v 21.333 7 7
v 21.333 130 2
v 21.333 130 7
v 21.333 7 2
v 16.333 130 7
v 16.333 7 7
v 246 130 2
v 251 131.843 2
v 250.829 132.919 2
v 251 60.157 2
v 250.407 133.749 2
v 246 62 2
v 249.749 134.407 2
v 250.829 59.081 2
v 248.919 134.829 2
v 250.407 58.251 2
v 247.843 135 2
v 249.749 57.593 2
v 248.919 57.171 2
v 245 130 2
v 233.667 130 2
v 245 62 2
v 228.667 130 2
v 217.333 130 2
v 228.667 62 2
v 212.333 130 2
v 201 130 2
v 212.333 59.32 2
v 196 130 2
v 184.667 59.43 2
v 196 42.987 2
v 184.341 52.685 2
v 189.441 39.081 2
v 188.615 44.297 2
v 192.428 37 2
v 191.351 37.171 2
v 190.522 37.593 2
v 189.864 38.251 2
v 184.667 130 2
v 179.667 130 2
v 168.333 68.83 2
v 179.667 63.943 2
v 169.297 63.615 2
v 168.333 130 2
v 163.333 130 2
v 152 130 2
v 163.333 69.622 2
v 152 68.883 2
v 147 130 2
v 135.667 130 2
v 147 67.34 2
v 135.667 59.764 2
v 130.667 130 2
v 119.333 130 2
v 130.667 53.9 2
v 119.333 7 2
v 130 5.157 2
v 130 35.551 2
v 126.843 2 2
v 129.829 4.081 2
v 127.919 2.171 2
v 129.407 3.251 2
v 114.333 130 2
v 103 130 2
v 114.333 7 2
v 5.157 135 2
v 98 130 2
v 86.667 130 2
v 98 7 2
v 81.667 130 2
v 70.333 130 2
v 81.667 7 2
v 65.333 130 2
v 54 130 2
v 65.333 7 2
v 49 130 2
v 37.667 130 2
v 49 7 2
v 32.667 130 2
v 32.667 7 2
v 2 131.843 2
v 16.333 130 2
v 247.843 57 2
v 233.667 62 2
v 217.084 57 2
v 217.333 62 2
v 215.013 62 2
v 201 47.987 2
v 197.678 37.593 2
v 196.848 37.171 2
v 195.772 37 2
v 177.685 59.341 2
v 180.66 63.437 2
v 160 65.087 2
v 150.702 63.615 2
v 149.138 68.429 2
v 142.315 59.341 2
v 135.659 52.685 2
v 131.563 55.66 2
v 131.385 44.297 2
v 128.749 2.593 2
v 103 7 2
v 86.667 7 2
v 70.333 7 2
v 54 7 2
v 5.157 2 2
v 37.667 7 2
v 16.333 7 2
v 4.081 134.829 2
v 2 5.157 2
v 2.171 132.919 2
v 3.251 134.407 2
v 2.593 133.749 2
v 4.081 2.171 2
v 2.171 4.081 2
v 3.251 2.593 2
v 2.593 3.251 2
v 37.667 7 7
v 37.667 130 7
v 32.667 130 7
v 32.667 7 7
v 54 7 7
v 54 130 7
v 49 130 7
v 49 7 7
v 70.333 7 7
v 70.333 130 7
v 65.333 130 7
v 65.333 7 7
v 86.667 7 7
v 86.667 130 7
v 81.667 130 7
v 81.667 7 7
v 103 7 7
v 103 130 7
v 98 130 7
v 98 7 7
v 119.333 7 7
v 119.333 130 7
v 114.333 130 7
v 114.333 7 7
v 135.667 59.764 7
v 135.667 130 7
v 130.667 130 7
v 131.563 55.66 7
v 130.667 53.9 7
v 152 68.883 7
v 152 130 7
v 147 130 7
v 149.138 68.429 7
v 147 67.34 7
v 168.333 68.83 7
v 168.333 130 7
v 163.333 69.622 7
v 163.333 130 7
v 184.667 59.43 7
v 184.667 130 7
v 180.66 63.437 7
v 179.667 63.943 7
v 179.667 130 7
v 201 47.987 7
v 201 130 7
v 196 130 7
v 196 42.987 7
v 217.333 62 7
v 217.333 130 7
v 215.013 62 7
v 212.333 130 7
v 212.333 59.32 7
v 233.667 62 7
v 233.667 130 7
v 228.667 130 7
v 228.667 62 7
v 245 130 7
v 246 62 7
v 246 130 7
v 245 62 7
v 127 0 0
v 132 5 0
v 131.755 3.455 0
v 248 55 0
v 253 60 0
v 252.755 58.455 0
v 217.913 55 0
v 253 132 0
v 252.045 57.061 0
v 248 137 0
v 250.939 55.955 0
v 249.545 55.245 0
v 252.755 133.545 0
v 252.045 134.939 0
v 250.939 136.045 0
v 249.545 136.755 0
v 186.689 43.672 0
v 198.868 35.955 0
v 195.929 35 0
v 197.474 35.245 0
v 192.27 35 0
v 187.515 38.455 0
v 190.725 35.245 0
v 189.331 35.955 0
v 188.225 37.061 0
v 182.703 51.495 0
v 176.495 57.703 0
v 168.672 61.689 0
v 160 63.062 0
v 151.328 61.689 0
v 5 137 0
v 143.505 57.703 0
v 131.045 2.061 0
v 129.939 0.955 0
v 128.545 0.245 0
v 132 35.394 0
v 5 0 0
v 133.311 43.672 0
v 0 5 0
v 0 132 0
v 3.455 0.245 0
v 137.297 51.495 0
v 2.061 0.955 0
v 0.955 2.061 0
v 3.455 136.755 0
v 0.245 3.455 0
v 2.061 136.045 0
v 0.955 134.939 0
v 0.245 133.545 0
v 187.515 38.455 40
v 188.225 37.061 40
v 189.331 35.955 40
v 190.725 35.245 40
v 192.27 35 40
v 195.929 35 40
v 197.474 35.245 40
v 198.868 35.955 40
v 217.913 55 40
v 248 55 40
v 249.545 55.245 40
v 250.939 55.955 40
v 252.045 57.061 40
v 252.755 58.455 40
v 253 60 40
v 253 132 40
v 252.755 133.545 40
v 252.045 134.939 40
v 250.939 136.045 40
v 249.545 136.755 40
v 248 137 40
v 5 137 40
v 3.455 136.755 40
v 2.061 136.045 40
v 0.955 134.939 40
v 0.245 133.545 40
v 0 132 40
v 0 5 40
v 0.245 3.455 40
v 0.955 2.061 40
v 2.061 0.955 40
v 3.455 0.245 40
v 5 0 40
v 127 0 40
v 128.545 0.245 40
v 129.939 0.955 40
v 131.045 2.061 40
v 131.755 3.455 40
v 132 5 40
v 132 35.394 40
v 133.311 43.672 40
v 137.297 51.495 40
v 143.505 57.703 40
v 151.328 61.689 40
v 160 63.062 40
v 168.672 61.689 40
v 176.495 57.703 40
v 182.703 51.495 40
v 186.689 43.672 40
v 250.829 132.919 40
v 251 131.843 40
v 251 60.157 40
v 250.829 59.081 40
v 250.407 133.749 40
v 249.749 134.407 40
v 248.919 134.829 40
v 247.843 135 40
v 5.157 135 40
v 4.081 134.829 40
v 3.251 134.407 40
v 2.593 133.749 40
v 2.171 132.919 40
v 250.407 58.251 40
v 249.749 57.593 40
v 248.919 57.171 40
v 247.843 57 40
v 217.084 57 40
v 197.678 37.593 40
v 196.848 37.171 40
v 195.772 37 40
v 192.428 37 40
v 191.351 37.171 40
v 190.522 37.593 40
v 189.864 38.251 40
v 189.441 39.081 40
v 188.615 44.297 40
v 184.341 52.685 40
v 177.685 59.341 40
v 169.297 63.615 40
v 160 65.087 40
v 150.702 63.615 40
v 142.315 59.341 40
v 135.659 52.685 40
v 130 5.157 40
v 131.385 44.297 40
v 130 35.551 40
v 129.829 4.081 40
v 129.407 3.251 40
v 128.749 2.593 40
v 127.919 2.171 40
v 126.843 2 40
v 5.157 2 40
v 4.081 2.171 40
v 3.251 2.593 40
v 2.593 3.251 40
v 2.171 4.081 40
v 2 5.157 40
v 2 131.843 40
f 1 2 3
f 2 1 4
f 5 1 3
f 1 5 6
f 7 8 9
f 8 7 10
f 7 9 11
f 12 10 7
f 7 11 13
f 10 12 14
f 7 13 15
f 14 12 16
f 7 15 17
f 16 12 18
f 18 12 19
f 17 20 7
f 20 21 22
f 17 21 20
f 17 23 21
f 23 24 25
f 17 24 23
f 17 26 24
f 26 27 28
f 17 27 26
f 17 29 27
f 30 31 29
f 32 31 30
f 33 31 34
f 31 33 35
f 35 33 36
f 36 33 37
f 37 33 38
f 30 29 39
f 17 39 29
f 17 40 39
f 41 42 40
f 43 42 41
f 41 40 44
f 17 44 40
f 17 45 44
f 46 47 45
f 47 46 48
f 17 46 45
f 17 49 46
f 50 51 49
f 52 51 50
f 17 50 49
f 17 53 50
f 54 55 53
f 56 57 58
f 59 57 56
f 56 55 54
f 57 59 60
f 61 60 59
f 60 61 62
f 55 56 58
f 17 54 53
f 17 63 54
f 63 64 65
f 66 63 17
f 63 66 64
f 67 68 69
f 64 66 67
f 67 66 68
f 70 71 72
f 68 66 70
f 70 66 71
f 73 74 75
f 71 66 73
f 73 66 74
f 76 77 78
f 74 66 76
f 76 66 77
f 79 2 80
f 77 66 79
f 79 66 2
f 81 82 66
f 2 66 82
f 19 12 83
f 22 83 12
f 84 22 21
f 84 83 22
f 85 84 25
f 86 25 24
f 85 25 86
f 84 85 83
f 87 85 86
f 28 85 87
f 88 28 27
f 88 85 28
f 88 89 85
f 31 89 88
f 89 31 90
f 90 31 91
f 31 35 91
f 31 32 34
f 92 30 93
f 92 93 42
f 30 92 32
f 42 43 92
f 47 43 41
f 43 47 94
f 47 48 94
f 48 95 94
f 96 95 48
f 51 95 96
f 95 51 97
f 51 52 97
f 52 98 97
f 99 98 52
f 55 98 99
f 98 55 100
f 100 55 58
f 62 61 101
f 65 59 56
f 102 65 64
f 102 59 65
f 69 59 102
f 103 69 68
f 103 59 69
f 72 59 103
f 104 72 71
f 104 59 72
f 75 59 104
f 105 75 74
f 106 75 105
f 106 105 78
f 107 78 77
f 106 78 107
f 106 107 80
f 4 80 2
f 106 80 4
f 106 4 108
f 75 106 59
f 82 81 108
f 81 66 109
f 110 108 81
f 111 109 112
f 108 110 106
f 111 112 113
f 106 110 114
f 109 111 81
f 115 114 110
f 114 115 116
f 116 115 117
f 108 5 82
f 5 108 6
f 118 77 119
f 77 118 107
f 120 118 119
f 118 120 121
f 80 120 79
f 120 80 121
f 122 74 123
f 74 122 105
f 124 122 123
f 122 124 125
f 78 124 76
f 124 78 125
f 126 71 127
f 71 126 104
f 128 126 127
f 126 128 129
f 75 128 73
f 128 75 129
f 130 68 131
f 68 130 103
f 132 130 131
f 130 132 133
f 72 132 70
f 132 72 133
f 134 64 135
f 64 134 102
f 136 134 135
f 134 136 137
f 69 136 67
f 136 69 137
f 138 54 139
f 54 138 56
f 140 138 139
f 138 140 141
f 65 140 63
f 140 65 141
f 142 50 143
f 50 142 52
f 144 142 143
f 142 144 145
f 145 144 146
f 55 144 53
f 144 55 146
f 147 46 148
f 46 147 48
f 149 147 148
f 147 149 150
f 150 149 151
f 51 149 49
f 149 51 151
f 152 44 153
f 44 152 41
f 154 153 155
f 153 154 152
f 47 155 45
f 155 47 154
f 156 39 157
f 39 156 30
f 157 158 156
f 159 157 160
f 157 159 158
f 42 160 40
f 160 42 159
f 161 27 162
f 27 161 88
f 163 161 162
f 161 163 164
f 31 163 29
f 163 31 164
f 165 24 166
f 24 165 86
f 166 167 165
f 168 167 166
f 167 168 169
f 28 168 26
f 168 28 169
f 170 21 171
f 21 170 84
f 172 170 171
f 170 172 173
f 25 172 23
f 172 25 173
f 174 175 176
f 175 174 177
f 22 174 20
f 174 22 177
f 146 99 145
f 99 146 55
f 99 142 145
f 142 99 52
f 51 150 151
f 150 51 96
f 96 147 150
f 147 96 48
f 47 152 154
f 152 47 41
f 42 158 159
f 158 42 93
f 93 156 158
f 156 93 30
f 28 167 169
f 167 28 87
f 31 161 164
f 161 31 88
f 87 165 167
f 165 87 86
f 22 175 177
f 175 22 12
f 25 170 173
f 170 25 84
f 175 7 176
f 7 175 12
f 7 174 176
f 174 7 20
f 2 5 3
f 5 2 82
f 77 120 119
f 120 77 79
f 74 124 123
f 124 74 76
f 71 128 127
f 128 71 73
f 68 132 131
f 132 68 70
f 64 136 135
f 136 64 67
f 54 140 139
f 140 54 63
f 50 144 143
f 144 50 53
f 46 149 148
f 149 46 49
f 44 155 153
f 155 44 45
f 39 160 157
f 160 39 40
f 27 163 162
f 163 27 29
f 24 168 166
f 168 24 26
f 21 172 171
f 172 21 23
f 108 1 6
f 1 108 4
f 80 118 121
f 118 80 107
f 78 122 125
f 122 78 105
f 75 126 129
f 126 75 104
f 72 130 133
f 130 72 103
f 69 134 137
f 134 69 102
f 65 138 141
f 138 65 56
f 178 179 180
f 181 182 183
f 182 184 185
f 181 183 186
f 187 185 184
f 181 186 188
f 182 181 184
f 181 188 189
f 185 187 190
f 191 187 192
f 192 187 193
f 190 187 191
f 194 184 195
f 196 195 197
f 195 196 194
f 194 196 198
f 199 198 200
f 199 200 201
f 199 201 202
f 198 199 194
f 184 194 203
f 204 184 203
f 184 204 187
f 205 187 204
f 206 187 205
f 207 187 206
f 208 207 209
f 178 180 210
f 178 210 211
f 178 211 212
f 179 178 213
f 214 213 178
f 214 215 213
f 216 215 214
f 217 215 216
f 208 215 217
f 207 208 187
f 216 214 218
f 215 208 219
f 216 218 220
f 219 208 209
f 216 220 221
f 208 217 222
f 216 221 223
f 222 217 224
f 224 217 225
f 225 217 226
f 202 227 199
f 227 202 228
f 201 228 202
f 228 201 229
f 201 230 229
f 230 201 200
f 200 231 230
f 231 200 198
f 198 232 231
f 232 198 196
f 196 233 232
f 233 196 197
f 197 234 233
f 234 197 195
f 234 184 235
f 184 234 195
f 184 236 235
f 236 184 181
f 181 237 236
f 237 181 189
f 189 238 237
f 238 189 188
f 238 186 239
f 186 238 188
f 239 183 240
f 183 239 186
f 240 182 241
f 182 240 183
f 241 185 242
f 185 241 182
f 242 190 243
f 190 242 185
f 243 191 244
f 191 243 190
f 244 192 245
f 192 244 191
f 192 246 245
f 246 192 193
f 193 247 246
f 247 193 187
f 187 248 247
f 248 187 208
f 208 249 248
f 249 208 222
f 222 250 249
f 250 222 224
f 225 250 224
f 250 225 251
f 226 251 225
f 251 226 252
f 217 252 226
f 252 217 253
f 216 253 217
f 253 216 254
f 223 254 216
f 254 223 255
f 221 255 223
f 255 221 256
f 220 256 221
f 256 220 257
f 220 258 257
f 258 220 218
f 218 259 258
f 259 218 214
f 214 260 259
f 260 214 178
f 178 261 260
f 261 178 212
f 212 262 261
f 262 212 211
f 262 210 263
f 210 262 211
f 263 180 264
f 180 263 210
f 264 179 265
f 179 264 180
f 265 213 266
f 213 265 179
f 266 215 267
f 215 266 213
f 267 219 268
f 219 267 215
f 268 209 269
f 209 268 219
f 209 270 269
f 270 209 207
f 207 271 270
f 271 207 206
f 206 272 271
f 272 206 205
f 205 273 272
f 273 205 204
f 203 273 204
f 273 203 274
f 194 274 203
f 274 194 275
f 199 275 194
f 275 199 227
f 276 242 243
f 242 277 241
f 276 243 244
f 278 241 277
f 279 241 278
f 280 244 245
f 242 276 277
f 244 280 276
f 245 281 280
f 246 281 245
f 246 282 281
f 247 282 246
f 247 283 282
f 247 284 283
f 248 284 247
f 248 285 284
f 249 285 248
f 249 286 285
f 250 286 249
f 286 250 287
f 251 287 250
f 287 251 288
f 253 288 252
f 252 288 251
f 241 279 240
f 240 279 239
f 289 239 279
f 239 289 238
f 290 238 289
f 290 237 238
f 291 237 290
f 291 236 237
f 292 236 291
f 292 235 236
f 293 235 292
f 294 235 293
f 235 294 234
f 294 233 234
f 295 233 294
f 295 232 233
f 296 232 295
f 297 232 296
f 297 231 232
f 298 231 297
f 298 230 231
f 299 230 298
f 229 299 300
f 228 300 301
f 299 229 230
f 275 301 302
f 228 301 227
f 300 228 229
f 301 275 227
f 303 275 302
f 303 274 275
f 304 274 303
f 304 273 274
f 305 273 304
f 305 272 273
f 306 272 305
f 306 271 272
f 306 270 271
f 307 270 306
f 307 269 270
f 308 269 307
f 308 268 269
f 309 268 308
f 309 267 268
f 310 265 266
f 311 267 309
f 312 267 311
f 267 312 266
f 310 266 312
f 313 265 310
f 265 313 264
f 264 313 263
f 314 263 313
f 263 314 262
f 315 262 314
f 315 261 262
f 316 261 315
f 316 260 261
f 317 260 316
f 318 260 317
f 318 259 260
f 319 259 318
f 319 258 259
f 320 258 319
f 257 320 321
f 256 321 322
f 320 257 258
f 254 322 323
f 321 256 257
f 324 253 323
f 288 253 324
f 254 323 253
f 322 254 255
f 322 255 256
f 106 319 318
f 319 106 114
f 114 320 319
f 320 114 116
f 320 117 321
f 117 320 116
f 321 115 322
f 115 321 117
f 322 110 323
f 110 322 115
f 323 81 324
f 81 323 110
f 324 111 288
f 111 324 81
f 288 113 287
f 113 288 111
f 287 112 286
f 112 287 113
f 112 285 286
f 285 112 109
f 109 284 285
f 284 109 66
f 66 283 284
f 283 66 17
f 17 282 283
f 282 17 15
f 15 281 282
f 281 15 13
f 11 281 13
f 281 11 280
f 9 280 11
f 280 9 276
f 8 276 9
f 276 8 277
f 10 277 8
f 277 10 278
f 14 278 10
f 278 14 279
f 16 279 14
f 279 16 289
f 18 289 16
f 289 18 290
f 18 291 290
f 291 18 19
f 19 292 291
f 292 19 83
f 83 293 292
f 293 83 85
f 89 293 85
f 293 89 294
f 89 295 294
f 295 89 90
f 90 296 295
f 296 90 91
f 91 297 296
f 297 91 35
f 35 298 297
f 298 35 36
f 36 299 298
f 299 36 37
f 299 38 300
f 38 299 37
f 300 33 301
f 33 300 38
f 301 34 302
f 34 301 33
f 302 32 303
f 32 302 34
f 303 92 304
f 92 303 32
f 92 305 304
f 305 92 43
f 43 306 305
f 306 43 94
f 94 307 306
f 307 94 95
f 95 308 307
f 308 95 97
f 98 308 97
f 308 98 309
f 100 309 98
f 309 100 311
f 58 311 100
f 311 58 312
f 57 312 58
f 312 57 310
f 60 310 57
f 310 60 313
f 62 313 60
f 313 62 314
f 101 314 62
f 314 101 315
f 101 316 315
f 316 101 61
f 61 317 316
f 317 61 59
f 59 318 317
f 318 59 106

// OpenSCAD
// Basic footpring (minus the faucet gap)
// +----+-----+----+----+
// | A  |  B  | D  | E  |
// |    |     +----+----+
// |    |     | C /
// |    |     |  /
// |    +-----|/  
// |    |
// +----+
//
// The faucet indentation will be at the bottom of B with its left edge at the
// left side of B.

a_dims = [132, 137];
b_dims = [66, 102];
c_dims = [20, 20];
d_dims = [c_dims[0], b_dims[1] - c_dims[1]];
e_dims = [35, d_dims[1]];
full_width = a_dims[0] + b_dims[0] + d_dims[0] + e_dims[0];
full_depth = a_dims[1];
faucet_radius = 56 / 2;
wall_thickness = 2;
corner_radius = 5;
wall_height = 40;
slat_count = 15;
slat_height = 5;
slat_width = 5;
slat_spacing = (full_width - (wall_thickness * 4)) / slat_count;
gutter_width = 5;
spout_offset = 20;
spout_width = 20;
spout_length = 40;


$fs=1;
$fn=20;

// The straight-edge outline of the plate (i.e. without the faucet indentation)
module hull() {
    union() {
        square(a_dims);
        translate([a_dims[0], a_dims[1] - b_dims[1]]) {
            square(b_dims);
            translate([b_dims[0], 0]) {
                polygon(points=[[0,0], c_dims, [0, c_dims[1]]]);
                translate([0, c_dims[1]]) {
                    square(d_dims);
                    translate([d_dims[0], 0]) {
                        square(e_dims);
                    }
                }
            }
        }
    }
}

// The full outline of the plate including the faucet indentation, but with square corners. We'll round these
// off for the final footprint.
module cornered_footprint() {
    difference() {
        hull();
        translate([a_dims[0] + faucet_radius, a_dims[1] - b_dims[1]]) {
            circle(r = faucet_radius, center = true);
        }
    }
}

// The actual 2D footprint with rounded corners.
module footprint() {
    minkowski() {
        offset(delta = -1 * corner_radius) {
            cornered_footprint();
        };
        circle(r = corner_radius);
    }
}


module base_plate() {
    module slats() {
        for (index = [0 : slat_count]) {
            offset = index * slat_spacing;
            translate([offset, 0, 0]) {
                cube([slat_width, full_depth, slat_height]);
            }       
        }
    }

    module slat_space() {
        linear_extrude(heigh=wall_height) {
            offset(delta = -1 * (wall_thickness + gutter_width)) {
                footprint();
            }
        }
    }

    union() {
        // The simple base plat
        linear_extrude(height=wall_thickness) footprint();

        // The slates with a gutter subtracted around the edge.
        translate([0, 0, wall_thickness]) {
            intersection() {
                slats();
                slat_space();
            }
        }
    } 
}

module wall(height, thickness) {
    linear_extrude(height=height) {
        difference() {
            children(0);
            offset(delta=-1 * thickness) {
                children(0);
            };
            for (child_idx = [1 : 1 : $children - 1])
            {
                children(child_idx);
            }
        }
    };
}

module spout() {
    difference() {
        cube([spout_width + wall_thickness * 2, spout_length, wall_height]);
        translate([wall_thickness, -1 * wall_thickness, wall_thickness]) {
            cube([spout_width, spout_length + wall_thickness * 2, wall_height]);
        };
    };
}

union() {
    base_plate();
    wall(wall_height, wall_thickness) { 
        footprint();
        // translate([spout_offset, 0, 0]) {
        //     square([spout_width, wall_thickness * 1.1]);
        // };
    }
    // translate([spout_offset - wall_thickness, -1 * spout_length, 0]) {
    //     spout();
    // }
}
